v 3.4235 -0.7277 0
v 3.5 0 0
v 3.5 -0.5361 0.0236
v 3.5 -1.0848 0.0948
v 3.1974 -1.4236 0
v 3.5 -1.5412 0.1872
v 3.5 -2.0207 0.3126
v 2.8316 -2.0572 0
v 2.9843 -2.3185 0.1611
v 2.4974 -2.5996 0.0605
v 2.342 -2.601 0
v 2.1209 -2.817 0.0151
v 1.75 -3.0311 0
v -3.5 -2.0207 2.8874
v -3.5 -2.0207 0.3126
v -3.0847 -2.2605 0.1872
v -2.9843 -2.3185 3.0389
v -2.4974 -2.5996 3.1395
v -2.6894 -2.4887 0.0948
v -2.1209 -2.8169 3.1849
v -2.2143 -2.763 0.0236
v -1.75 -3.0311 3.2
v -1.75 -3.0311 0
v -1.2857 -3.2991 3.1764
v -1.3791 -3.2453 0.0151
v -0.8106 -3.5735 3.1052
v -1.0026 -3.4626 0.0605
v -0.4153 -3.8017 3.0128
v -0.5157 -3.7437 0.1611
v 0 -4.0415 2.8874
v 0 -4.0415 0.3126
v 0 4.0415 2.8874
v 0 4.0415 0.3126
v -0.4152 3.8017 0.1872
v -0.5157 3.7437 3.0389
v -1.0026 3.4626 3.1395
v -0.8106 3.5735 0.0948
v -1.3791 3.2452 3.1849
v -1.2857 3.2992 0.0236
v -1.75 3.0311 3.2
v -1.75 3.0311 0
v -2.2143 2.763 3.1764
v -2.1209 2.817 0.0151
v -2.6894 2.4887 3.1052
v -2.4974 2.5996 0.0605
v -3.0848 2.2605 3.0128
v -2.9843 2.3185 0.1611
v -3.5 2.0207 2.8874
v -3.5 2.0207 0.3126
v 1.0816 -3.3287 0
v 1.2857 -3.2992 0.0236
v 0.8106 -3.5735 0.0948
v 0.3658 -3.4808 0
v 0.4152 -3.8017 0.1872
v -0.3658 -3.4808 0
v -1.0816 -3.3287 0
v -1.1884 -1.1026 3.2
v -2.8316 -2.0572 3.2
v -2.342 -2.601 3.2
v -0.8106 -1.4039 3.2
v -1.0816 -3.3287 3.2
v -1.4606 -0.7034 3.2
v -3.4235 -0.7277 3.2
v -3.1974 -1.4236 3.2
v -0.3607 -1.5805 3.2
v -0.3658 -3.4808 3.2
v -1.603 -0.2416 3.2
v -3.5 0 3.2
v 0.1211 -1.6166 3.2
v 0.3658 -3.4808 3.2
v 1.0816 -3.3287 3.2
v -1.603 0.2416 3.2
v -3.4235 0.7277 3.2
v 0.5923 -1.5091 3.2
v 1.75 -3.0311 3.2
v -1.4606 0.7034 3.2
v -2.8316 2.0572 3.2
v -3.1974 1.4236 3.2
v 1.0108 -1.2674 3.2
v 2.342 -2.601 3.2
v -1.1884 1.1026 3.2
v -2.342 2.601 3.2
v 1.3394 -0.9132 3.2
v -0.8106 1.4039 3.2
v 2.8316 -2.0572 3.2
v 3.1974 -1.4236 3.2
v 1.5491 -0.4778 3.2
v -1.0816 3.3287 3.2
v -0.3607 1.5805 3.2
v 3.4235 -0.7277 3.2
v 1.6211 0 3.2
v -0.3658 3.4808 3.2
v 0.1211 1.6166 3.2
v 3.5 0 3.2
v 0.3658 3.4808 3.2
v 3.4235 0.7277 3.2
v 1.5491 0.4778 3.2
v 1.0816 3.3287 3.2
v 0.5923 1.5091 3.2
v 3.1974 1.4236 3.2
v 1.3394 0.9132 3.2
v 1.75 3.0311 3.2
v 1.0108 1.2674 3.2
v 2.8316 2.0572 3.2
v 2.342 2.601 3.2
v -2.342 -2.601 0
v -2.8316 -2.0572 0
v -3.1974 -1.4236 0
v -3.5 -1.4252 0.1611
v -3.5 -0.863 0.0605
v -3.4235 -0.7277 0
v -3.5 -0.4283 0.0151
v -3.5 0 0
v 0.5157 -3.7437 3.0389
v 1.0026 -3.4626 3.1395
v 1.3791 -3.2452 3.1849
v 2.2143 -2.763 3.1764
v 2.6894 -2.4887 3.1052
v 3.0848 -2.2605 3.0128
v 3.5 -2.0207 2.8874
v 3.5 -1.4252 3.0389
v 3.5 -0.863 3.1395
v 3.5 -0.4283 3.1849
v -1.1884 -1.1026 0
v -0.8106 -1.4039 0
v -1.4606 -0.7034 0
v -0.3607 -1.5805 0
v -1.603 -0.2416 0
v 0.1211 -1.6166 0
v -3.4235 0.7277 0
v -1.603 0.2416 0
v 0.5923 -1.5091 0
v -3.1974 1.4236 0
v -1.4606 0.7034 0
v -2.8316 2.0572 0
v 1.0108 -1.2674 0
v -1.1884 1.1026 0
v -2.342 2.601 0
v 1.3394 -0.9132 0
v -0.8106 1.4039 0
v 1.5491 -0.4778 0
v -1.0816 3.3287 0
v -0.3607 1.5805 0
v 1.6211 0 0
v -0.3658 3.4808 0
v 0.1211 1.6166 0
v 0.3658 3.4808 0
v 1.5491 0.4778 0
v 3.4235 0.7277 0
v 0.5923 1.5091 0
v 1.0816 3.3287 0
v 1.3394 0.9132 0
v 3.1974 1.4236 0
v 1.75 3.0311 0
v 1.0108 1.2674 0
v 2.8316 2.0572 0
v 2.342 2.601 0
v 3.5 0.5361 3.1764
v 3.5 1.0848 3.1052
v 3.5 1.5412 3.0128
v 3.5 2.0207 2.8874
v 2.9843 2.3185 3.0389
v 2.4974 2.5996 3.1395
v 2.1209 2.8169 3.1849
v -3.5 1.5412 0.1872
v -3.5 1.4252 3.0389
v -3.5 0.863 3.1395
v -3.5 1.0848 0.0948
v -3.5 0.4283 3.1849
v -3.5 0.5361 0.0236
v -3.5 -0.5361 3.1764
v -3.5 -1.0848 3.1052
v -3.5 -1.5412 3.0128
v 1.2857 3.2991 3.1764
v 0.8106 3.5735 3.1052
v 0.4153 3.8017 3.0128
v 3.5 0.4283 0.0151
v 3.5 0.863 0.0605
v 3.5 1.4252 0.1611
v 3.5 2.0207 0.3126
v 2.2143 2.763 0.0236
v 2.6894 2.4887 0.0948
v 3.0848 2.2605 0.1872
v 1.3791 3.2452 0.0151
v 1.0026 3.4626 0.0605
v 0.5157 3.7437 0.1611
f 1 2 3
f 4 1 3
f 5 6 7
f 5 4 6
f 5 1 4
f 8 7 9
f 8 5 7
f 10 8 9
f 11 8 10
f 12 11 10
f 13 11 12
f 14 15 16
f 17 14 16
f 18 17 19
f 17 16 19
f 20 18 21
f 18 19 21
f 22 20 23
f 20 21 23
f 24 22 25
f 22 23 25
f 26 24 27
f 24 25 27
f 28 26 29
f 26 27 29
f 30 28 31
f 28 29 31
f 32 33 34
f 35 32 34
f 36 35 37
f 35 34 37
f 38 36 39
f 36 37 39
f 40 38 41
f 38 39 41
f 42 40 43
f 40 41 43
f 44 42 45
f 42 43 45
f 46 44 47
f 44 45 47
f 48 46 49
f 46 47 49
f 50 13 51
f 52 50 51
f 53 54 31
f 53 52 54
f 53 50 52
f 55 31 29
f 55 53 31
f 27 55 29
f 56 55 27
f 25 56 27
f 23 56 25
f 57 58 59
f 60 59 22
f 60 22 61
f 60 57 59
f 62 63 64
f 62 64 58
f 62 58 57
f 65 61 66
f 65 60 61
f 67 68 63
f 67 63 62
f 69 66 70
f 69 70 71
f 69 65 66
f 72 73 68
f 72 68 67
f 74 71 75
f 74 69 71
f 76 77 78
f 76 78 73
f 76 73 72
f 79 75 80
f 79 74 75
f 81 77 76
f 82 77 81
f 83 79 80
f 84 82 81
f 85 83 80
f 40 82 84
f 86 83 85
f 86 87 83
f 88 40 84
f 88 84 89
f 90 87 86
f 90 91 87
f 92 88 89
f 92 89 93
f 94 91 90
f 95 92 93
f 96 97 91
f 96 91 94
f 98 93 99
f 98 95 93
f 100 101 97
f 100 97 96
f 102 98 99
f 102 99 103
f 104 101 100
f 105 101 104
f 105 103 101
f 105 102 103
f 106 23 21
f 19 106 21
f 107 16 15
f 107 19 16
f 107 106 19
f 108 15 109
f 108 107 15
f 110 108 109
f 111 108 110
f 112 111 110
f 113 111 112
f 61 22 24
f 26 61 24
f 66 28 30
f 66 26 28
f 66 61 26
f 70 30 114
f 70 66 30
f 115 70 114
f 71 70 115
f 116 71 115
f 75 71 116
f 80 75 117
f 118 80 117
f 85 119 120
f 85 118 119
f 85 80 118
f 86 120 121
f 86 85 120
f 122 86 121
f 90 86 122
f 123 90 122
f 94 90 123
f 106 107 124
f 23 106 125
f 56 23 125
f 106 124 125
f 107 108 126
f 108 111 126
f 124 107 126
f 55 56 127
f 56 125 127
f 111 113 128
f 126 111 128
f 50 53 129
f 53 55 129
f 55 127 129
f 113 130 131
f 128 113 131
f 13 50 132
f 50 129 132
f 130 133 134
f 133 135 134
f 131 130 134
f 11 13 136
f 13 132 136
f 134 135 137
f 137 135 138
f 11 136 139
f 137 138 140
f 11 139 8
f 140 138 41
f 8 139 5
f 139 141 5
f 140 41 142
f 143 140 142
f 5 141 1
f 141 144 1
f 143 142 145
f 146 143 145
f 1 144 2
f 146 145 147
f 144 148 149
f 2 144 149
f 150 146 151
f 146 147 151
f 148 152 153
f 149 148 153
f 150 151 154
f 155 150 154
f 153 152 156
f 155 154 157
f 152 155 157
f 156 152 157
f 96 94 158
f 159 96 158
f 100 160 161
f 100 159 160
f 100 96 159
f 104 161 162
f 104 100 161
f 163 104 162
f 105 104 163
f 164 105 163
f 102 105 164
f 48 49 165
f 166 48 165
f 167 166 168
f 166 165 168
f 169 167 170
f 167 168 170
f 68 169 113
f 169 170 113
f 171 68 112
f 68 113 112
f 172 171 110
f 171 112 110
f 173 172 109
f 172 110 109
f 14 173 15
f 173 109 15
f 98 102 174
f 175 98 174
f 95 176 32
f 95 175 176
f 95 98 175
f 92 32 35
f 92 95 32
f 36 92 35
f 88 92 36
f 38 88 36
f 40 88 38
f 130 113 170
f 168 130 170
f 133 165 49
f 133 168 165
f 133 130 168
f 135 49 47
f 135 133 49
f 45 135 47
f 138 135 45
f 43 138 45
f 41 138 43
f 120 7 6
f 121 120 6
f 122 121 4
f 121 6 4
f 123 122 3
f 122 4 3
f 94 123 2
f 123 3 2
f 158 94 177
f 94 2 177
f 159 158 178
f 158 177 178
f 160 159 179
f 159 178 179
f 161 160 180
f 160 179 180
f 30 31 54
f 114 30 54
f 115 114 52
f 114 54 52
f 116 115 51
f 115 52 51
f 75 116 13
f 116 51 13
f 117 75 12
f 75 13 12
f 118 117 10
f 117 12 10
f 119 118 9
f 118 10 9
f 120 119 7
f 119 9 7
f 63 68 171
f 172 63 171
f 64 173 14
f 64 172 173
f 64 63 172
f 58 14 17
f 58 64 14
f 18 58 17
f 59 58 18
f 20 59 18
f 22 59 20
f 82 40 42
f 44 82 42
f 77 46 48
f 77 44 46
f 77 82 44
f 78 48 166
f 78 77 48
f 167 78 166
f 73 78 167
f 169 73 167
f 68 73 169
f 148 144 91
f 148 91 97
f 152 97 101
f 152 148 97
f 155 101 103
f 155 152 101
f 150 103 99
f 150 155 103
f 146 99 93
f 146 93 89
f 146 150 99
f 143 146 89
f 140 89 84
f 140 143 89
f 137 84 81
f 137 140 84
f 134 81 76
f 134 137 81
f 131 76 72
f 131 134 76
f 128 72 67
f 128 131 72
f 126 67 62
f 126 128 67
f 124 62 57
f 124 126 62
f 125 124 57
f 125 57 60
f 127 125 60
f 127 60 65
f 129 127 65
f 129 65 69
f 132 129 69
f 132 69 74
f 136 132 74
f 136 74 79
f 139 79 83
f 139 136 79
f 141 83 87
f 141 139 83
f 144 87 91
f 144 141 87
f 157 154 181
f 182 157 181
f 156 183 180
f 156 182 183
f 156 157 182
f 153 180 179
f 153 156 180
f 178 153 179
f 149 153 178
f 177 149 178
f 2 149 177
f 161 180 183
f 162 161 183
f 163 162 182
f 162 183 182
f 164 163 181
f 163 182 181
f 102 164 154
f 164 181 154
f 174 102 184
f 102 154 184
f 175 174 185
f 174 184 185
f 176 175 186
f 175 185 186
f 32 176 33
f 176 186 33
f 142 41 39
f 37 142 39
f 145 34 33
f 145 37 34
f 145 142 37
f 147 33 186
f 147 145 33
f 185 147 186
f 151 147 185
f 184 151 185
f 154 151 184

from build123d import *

# Parameters (mm, degrees)
SKETCH_1_R          = 1.621125
EXTRUDE_403_DEPTH   = 3.2
SKETCH_2_OUTSIDE_W  = 36.28
SKETCH_2_OUTSIDE_H  = 37.362
SKETCH_2_OUTSIDE_R  = 3.5
CUT_EXTRUDE_1_DEPTH = 7.23083729
CUT_EXTRUDE_1_DRAFT = -60
SKETCH_3_OUTSIDE_W  = 36.28
SKETCH_3_OUTSIDE_H  = 37.362
SKETCH_3_OUTSIDE_R  = 3.5
CUT_EXTRUDE_2_DEPTH = 7.23083729
CUT_EXTRUDE_2_DRAFT = -60


with BuildPart() as part:
    # 草图1 → Extrude 403 (new body)
    with BuildSketch(Plane.XY):
        Polygon((0, 4.041451884), (-3.5, 2.020725942), (-3.5, -2.020725942), (0, -4.041451884), (3.5, -2.020725942), (3.5, 2.020725942), align=None)
        Circle(SKETCH_1_R, mode=Mode.SUBTRACT)
    extrude(amount=EXTRUDE_403_DEPTH)


with BuildPart() as cut_extrude_1_tool:
    # 草图2 outside → 切除-拉伸1 (with draft: the straight prism first)
    with BuildSketch(Plane(origin=(0, 0, 0), x_dir=(-1, 0, 0), z_dir=(0, 0, -1))):
        Rectangle(SKETCH_2_OUTSIDE_W, SKETCH_2_OUTSIDE_H)
        Circle(SKETCH_2_OUTSIDE_R, mode=Mode.SUBTRACT)
    extrude(amount=-CUT_EXTRUDE_1_DEPTH)
    # 切除-拉伸1: the draft: its side faces are tilted about the plane it starts from
    cut_extrude_1_sides = [cut_extrude_1_tool.faces().sort_by_distance(p)[0] for p in [
        (0, -18.681, 3.615418645),
        (-18.14, 0, 3.615418645),
        (0, 18.681, 3.615418645),
        (18.14, 0, 3.615418645),
        (3.5, 0, 3.615418645),
    ]]
    draft(cut_extrude_1_sides, Plane(origin=(0, 0, 0), x_dir=(-1, 0, 0), z_dir=(0, 0, -1)), CUT_EXTRUDE_1_DRAFT)


with BuildPart() as part_1:
    add(part.part)

    # 切除-拉伸1: cut by cut_extrude_1_tool
    add(cut_extrude_1_tool.part, mode=Mode.SUBTRACT)


with BuildPart() as cut_extrude_2_tool:
    # 草图3 outside → 切除-拉伸2 (with draft: the straight prism first)
    with BuildSketch(Plane.XY.offset(3.2)):
        Rectangle(SKETCH_3_OUTSIDE_W, SKETCH_3_OUTSIDE_H)
        Circle(SKETCH_3_OUTSIDE_R, mode=Mode.SUBTRACT)
    extrude(amount=-CUT_EXTRUDE_2_DEPTH)
    # 切除-拉伸2: the draft: its side faces are tilted about the plane it starts from
    cut_extrude_2_sides = [cut_extrude_2_tool.faces().sort_by_distance(p)[0] for p in [
        (0, -18.681, -0.415418645),
        (18.14, 0, -0.415418645),
        (0, 18.681, -0.415418645),
        (-18.14, 0, -0.415418645),
        (-3.5, 0, -0.415418645),
    ]]
    draft(cut_extrude_2_sides, Plane.XY.offset(3.2), CUT_EXTRUDE_2_DRAFT)


with BuildPart() as part_2:
    add(part_1.part)

    # 切除-拉伸2: cut by cut_extrude_2_tool
    add(cut_extrude_2_tool.part, mode=Mode.SUBTRACT)


solid = part_2.part
